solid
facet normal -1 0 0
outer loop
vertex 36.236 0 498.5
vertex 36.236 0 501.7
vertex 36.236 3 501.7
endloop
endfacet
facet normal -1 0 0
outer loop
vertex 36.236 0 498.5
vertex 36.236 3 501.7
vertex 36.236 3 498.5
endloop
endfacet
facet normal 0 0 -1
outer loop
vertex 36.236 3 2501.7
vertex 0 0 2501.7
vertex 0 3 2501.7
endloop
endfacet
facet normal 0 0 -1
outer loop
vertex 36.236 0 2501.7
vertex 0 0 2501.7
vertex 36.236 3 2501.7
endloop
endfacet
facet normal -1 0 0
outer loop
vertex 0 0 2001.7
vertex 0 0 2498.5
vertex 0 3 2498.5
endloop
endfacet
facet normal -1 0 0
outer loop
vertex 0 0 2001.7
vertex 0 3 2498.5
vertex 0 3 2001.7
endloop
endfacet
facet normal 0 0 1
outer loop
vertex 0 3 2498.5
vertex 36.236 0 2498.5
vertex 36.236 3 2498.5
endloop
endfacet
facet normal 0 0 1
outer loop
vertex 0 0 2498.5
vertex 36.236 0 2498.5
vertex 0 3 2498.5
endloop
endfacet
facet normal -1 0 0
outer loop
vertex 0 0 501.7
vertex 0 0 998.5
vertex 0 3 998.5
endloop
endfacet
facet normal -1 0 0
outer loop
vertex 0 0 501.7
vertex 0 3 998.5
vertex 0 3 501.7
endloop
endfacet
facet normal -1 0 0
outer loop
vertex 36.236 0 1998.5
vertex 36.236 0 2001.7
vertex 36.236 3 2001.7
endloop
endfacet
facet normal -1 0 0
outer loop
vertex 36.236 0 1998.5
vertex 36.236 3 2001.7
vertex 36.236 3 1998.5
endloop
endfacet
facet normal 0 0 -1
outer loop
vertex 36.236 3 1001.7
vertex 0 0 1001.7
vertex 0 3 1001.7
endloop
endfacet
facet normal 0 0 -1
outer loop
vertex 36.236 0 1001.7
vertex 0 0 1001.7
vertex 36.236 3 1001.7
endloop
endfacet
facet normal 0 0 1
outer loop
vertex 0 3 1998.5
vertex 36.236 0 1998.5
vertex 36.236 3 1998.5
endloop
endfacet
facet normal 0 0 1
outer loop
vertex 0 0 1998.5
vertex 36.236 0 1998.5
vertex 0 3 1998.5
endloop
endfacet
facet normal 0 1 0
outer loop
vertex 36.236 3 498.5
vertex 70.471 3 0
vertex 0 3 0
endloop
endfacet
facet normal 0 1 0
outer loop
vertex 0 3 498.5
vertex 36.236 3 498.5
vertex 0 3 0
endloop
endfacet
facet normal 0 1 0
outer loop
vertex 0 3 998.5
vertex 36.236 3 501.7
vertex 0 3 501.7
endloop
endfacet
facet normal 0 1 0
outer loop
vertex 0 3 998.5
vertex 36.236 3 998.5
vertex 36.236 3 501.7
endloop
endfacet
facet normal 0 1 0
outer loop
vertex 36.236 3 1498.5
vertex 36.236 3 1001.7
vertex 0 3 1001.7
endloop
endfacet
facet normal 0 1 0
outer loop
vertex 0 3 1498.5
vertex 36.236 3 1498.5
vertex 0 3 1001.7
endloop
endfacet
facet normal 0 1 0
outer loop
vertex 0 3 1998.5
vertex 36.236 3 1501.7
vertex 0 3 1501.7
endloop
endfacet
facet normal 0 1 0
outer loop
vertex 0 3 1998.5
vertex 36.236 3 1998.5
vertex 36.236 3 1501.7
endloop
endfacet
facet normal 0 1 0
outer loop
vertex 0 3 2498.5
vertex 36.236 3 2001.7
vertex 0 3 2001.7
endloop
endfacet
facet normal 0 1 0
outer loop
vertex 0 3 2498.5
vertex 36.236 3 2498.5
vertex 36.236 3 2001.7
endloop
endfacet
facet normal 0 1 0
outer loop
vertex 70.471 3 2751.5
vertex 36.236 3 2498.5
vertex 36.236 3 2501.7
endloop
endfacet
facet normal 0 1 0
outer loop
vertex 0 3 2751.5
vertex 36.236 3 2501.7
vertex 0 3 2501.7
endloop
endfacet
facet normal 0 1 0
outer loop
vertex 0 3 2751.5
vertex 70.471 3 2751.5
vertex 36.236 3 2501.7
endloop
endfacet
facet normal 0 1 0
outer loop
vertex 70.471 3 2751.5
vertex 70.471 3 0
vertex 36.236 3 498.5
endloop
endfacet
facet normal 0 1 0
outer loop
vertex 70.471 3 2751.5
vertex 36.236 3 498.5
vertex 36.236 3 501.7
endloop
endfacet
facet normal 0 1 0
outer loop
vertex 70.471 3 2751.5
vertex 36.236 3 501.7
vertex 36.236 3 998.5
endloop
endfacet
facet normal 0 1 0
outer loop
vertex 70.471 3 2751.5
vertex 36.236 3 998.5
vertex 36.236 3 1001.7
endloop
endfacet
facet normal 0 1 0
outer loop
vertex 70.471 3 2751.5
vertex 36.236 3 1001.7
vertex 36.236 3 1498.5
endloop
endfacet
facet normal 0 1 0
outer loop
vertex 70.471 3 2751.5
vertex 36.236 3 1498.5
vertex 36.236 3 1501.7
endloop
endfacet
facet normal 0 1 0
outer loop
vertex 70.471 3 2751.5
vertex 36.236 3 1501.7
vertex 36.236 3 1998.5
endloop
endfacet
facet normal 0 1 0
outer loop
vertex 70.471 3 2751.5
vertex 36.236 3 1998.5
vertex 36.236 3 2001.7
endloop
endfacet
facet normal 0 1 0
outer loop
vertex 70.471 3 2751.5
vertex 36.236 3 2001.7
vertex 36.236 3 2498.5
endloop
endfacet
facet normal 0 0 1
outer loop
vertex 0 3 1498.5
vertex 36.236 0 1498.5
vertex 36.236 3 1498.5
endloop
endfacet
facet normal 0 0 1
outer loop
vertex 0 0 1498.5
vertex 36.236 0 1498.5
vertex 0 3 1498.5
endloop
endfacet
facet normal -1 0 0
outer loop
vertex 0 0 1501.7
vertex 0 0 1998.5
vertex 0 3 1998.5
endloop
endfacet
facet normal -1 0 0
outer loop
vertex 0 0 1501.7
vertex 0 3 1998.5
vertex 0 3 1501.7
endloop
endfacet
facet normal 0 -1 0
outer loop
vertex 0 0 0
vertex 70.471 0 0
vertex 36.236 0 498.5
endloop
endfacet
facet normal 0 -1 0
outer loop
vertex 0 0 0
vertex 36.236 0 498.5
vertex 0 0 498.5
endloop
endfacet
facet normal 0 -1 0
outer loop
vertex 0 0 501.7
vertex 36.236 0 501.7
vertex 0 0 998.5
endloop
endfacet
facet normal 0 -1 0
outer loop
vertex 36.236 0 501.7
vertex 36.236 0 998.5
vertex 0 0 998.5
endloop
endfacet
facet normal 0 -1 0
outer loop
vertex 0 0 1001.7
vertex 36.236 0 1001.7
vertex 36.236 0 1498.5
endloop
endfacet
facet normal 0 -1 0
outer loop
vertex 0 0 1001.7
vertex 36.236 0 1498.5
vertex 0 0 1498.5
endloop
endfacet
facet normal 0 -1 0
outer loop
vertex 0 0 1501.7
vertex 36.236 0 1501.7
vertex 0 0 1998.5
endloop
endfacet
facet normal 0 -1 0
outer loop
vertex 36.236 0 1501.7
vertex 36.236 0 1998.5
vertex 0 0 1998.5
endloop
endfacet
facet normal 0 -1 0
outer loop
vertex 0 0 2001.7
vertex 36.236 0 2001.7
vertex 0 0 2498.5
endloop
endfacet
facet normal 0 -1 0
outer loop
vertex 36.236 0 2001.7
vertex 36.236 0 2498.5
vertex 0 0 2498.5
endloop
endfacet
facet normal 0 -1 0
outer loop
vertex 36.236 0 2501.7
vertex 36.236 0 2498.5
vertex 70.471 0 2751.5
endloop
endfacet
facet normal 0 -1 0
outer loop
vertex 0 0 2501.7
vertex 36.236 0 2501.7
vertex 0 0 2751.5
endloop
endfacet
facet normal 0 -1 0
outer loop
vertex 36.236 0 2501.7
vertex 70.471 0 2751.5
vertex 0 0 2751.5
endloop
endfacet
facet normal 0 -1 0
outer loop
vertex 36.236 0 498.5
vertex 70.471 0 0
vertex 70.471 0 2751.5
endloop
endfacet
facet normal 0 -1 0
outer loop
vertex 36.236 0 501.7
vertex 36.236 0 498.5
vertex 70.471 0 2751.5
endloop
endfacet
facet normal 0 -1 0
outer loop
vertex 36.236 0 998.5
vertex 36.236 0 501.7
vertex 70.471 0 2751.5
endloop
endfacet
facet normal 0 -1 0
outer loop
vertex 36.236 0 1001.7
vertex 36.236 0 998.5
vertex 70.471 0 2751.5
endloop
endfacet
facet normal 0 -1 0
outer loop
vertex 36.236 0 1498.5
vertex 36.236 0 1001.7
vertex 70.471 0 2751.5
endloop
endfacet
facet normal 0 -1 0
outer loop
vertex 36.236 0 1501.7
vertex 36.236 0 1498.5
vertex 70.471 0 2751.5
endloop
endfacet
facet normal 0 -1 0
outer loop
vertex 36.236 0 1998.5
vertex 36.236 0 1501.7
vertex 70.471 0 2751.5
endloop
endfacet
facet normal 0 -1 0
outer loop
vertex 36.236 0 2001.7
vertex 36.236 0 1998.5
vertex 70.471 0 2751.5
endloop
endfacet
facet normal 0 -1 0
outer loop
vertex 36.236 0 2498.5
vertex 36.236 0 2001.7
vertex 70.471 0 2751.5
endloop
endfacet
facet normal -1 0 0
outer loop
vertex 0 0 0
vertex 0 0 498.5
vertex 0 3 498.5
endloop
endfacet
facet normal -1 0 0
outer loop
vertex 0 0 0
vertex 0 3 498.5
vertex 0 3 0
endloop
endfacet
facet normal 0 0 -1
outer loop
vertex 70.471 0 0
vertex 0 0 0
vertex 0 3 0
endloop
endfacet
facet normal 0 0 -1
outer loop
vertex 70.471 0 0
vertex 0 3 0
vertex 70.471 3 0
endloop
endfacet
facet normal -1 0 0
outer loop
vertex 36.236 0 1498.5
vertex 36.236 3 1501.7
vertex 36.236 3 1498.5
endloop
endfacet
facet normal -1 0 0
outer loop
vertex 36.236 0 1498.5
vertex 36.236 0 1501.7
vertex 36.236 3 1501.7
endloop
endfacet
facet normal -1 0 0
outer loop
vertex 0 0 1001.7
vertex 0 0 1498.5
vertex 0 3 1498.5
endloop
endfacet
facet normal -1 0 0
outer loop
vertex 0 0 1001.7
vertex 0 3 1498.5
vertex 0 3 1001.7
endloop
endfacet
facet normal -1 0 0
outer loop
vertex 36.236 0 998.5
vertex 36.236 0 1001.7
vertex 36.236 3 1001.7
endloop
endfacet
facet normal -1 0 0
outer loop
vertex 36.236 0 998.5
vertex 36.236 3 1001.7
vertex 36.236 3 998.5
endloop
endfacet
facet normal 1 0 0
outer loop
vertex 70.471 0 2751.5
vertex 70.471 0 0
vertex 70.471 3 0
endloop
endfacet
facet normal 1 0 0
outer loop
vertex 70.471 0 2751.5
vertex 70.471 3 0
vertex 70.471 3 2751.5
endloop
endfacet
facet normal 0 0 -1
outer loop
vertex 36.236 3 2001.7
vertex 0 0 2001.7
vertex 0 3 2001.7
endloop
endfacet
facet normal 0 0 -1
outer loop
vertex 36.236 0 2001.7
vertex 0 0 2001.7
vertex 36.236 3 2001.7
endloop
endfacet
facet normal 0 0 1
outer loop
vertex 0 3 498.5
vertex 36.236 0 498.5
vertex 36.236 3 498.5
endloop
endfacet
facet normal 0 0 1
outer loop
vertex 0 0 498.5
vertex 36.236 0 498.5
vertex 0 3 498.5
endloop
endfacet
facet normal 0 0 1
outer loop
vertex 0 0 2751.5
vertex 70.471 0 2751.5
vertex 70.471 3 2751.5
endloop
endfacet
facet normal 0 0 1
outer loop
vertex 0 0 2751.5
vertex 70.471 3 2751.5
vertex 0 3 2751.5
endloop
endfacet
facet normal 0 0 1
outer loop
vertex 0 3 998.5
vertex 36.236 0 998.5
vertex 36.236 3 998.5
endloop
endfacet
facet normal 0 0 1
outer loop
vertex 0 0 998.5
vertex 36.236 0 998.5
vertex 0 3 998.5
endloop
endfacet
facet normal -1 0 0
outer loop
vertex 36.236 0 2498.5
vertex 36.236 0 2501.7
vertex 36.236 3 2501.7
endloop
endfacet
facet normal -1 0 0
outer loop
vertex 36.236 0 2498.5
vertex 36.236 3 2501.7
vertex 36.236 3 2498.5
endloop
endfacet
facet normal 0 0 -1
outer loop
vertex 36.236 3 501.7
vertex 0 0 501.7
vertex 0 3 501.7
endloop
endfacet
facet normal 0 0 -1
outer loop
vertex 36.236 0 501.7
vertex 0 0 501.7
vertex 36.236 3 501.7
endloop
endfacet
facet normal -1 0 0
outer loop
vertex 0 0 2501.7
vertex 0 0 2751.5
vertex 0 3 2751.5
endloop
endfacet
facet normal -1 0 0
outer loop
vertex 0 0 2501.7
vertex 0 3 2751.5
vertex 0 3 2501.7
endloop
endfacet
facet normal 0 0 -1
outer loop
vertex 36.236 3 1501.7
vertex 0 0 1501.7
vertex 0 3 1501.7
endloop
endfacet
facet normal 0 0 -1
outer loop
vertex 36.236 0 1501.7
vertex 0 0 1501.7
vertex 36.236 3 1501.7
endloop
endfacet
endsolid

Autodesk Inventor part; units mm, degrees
ref_plane "YZ Plane" through (0, 0, 0) normal (1, 0, 0) x (0, 1, 0)
ref_plane "XZ Plane" through (0, 0, 0) normal (0, 1, 0) x (-1, 0, 0)
ref_plane "XY Plane" through (0, 0, 0) normal (0, 0, 1) x (1, 0, 0)
sketch "Sketch6" plane through (0, 0, 0) normal (0, 1, 0) x (-1, 0, 0)
  line L0 (0, 0) -> (-70.4709, 0)
  line L1 (-70.4709, 0) -> (-70.4709, 2751.5)
  line L2 (-70.4709, 2751.5) -> (0, 2751.5)
  line L3 (0, 2751.5) -> (0, 0)
  dimension "d26" = 70.4709
  dimension "d27" = 2751.5
extrude "Plate4" add sketch "Sketch6" along normal blind 3
sketch "Sketch7" plane through (0, 0, 0) normal (0, -1, 0) x (1, 0, 0)
  line L0 (0, 2751.5) -> (70.4709, 2751.5) projected
  line L1 (0, 0) -> (0, 2751.5) projected
  line L2 (70.4709, 0) -> (0, 0) projected
  line L3 (70.4709, 2751.5) -> (70.4709, 0) projected
  line L4 (0, 501.7) -> (36.2355, 501.7)
  line L5 (36.2355, 501.7) -> (36.2355, 498.5)
  line L6 (36.2355, 498.5) -> (0, 498.5)
  line L7 (0, 498.5) -> (0, 501.7)
  point P0 (0, 498.5)
  point P1 (0, 200)
  point P2 (46.4173, 200)
  point P3 (0, 498.5)
  dimension "d29" = 36.2355
  dimension "d30" = 3.2
  dimension "d31" = 498.5
extrude "Extrusion2" cut sketch "Sketch7" against normal through all contours L4 L5 L6 L1
pattern_linear "Rectangular Pattern1" count 5 spacing 500 along (0, 0, 1) of "Extrusion2"
equation "\"d26\" = Stringer3_deep"
equation "\"d28\" = Thickness"
equation "\"BendReliefWidth\" = Thickness"
equation "\"BendReliefDepth\" = 0.5 * Thickness"
equation "\"CornerReliefSize\" = 4 * Thickness"
equation "\"MinimumRemnant\" = 2 * Thickness"
equation "\"TransitionRadius\" = BendRadius"
equation "\"JacobiRadiusSize\" = BendRadius"
equation "\"GapSize\" = Thickness"
equation "\"Stringer3_deep\" = 70.470938"
equation "\"Thickness\" = 3"
equation "\"BendRadius\" = 5"
properties part number "BSH 043 stringer 3" material "09g2s"
